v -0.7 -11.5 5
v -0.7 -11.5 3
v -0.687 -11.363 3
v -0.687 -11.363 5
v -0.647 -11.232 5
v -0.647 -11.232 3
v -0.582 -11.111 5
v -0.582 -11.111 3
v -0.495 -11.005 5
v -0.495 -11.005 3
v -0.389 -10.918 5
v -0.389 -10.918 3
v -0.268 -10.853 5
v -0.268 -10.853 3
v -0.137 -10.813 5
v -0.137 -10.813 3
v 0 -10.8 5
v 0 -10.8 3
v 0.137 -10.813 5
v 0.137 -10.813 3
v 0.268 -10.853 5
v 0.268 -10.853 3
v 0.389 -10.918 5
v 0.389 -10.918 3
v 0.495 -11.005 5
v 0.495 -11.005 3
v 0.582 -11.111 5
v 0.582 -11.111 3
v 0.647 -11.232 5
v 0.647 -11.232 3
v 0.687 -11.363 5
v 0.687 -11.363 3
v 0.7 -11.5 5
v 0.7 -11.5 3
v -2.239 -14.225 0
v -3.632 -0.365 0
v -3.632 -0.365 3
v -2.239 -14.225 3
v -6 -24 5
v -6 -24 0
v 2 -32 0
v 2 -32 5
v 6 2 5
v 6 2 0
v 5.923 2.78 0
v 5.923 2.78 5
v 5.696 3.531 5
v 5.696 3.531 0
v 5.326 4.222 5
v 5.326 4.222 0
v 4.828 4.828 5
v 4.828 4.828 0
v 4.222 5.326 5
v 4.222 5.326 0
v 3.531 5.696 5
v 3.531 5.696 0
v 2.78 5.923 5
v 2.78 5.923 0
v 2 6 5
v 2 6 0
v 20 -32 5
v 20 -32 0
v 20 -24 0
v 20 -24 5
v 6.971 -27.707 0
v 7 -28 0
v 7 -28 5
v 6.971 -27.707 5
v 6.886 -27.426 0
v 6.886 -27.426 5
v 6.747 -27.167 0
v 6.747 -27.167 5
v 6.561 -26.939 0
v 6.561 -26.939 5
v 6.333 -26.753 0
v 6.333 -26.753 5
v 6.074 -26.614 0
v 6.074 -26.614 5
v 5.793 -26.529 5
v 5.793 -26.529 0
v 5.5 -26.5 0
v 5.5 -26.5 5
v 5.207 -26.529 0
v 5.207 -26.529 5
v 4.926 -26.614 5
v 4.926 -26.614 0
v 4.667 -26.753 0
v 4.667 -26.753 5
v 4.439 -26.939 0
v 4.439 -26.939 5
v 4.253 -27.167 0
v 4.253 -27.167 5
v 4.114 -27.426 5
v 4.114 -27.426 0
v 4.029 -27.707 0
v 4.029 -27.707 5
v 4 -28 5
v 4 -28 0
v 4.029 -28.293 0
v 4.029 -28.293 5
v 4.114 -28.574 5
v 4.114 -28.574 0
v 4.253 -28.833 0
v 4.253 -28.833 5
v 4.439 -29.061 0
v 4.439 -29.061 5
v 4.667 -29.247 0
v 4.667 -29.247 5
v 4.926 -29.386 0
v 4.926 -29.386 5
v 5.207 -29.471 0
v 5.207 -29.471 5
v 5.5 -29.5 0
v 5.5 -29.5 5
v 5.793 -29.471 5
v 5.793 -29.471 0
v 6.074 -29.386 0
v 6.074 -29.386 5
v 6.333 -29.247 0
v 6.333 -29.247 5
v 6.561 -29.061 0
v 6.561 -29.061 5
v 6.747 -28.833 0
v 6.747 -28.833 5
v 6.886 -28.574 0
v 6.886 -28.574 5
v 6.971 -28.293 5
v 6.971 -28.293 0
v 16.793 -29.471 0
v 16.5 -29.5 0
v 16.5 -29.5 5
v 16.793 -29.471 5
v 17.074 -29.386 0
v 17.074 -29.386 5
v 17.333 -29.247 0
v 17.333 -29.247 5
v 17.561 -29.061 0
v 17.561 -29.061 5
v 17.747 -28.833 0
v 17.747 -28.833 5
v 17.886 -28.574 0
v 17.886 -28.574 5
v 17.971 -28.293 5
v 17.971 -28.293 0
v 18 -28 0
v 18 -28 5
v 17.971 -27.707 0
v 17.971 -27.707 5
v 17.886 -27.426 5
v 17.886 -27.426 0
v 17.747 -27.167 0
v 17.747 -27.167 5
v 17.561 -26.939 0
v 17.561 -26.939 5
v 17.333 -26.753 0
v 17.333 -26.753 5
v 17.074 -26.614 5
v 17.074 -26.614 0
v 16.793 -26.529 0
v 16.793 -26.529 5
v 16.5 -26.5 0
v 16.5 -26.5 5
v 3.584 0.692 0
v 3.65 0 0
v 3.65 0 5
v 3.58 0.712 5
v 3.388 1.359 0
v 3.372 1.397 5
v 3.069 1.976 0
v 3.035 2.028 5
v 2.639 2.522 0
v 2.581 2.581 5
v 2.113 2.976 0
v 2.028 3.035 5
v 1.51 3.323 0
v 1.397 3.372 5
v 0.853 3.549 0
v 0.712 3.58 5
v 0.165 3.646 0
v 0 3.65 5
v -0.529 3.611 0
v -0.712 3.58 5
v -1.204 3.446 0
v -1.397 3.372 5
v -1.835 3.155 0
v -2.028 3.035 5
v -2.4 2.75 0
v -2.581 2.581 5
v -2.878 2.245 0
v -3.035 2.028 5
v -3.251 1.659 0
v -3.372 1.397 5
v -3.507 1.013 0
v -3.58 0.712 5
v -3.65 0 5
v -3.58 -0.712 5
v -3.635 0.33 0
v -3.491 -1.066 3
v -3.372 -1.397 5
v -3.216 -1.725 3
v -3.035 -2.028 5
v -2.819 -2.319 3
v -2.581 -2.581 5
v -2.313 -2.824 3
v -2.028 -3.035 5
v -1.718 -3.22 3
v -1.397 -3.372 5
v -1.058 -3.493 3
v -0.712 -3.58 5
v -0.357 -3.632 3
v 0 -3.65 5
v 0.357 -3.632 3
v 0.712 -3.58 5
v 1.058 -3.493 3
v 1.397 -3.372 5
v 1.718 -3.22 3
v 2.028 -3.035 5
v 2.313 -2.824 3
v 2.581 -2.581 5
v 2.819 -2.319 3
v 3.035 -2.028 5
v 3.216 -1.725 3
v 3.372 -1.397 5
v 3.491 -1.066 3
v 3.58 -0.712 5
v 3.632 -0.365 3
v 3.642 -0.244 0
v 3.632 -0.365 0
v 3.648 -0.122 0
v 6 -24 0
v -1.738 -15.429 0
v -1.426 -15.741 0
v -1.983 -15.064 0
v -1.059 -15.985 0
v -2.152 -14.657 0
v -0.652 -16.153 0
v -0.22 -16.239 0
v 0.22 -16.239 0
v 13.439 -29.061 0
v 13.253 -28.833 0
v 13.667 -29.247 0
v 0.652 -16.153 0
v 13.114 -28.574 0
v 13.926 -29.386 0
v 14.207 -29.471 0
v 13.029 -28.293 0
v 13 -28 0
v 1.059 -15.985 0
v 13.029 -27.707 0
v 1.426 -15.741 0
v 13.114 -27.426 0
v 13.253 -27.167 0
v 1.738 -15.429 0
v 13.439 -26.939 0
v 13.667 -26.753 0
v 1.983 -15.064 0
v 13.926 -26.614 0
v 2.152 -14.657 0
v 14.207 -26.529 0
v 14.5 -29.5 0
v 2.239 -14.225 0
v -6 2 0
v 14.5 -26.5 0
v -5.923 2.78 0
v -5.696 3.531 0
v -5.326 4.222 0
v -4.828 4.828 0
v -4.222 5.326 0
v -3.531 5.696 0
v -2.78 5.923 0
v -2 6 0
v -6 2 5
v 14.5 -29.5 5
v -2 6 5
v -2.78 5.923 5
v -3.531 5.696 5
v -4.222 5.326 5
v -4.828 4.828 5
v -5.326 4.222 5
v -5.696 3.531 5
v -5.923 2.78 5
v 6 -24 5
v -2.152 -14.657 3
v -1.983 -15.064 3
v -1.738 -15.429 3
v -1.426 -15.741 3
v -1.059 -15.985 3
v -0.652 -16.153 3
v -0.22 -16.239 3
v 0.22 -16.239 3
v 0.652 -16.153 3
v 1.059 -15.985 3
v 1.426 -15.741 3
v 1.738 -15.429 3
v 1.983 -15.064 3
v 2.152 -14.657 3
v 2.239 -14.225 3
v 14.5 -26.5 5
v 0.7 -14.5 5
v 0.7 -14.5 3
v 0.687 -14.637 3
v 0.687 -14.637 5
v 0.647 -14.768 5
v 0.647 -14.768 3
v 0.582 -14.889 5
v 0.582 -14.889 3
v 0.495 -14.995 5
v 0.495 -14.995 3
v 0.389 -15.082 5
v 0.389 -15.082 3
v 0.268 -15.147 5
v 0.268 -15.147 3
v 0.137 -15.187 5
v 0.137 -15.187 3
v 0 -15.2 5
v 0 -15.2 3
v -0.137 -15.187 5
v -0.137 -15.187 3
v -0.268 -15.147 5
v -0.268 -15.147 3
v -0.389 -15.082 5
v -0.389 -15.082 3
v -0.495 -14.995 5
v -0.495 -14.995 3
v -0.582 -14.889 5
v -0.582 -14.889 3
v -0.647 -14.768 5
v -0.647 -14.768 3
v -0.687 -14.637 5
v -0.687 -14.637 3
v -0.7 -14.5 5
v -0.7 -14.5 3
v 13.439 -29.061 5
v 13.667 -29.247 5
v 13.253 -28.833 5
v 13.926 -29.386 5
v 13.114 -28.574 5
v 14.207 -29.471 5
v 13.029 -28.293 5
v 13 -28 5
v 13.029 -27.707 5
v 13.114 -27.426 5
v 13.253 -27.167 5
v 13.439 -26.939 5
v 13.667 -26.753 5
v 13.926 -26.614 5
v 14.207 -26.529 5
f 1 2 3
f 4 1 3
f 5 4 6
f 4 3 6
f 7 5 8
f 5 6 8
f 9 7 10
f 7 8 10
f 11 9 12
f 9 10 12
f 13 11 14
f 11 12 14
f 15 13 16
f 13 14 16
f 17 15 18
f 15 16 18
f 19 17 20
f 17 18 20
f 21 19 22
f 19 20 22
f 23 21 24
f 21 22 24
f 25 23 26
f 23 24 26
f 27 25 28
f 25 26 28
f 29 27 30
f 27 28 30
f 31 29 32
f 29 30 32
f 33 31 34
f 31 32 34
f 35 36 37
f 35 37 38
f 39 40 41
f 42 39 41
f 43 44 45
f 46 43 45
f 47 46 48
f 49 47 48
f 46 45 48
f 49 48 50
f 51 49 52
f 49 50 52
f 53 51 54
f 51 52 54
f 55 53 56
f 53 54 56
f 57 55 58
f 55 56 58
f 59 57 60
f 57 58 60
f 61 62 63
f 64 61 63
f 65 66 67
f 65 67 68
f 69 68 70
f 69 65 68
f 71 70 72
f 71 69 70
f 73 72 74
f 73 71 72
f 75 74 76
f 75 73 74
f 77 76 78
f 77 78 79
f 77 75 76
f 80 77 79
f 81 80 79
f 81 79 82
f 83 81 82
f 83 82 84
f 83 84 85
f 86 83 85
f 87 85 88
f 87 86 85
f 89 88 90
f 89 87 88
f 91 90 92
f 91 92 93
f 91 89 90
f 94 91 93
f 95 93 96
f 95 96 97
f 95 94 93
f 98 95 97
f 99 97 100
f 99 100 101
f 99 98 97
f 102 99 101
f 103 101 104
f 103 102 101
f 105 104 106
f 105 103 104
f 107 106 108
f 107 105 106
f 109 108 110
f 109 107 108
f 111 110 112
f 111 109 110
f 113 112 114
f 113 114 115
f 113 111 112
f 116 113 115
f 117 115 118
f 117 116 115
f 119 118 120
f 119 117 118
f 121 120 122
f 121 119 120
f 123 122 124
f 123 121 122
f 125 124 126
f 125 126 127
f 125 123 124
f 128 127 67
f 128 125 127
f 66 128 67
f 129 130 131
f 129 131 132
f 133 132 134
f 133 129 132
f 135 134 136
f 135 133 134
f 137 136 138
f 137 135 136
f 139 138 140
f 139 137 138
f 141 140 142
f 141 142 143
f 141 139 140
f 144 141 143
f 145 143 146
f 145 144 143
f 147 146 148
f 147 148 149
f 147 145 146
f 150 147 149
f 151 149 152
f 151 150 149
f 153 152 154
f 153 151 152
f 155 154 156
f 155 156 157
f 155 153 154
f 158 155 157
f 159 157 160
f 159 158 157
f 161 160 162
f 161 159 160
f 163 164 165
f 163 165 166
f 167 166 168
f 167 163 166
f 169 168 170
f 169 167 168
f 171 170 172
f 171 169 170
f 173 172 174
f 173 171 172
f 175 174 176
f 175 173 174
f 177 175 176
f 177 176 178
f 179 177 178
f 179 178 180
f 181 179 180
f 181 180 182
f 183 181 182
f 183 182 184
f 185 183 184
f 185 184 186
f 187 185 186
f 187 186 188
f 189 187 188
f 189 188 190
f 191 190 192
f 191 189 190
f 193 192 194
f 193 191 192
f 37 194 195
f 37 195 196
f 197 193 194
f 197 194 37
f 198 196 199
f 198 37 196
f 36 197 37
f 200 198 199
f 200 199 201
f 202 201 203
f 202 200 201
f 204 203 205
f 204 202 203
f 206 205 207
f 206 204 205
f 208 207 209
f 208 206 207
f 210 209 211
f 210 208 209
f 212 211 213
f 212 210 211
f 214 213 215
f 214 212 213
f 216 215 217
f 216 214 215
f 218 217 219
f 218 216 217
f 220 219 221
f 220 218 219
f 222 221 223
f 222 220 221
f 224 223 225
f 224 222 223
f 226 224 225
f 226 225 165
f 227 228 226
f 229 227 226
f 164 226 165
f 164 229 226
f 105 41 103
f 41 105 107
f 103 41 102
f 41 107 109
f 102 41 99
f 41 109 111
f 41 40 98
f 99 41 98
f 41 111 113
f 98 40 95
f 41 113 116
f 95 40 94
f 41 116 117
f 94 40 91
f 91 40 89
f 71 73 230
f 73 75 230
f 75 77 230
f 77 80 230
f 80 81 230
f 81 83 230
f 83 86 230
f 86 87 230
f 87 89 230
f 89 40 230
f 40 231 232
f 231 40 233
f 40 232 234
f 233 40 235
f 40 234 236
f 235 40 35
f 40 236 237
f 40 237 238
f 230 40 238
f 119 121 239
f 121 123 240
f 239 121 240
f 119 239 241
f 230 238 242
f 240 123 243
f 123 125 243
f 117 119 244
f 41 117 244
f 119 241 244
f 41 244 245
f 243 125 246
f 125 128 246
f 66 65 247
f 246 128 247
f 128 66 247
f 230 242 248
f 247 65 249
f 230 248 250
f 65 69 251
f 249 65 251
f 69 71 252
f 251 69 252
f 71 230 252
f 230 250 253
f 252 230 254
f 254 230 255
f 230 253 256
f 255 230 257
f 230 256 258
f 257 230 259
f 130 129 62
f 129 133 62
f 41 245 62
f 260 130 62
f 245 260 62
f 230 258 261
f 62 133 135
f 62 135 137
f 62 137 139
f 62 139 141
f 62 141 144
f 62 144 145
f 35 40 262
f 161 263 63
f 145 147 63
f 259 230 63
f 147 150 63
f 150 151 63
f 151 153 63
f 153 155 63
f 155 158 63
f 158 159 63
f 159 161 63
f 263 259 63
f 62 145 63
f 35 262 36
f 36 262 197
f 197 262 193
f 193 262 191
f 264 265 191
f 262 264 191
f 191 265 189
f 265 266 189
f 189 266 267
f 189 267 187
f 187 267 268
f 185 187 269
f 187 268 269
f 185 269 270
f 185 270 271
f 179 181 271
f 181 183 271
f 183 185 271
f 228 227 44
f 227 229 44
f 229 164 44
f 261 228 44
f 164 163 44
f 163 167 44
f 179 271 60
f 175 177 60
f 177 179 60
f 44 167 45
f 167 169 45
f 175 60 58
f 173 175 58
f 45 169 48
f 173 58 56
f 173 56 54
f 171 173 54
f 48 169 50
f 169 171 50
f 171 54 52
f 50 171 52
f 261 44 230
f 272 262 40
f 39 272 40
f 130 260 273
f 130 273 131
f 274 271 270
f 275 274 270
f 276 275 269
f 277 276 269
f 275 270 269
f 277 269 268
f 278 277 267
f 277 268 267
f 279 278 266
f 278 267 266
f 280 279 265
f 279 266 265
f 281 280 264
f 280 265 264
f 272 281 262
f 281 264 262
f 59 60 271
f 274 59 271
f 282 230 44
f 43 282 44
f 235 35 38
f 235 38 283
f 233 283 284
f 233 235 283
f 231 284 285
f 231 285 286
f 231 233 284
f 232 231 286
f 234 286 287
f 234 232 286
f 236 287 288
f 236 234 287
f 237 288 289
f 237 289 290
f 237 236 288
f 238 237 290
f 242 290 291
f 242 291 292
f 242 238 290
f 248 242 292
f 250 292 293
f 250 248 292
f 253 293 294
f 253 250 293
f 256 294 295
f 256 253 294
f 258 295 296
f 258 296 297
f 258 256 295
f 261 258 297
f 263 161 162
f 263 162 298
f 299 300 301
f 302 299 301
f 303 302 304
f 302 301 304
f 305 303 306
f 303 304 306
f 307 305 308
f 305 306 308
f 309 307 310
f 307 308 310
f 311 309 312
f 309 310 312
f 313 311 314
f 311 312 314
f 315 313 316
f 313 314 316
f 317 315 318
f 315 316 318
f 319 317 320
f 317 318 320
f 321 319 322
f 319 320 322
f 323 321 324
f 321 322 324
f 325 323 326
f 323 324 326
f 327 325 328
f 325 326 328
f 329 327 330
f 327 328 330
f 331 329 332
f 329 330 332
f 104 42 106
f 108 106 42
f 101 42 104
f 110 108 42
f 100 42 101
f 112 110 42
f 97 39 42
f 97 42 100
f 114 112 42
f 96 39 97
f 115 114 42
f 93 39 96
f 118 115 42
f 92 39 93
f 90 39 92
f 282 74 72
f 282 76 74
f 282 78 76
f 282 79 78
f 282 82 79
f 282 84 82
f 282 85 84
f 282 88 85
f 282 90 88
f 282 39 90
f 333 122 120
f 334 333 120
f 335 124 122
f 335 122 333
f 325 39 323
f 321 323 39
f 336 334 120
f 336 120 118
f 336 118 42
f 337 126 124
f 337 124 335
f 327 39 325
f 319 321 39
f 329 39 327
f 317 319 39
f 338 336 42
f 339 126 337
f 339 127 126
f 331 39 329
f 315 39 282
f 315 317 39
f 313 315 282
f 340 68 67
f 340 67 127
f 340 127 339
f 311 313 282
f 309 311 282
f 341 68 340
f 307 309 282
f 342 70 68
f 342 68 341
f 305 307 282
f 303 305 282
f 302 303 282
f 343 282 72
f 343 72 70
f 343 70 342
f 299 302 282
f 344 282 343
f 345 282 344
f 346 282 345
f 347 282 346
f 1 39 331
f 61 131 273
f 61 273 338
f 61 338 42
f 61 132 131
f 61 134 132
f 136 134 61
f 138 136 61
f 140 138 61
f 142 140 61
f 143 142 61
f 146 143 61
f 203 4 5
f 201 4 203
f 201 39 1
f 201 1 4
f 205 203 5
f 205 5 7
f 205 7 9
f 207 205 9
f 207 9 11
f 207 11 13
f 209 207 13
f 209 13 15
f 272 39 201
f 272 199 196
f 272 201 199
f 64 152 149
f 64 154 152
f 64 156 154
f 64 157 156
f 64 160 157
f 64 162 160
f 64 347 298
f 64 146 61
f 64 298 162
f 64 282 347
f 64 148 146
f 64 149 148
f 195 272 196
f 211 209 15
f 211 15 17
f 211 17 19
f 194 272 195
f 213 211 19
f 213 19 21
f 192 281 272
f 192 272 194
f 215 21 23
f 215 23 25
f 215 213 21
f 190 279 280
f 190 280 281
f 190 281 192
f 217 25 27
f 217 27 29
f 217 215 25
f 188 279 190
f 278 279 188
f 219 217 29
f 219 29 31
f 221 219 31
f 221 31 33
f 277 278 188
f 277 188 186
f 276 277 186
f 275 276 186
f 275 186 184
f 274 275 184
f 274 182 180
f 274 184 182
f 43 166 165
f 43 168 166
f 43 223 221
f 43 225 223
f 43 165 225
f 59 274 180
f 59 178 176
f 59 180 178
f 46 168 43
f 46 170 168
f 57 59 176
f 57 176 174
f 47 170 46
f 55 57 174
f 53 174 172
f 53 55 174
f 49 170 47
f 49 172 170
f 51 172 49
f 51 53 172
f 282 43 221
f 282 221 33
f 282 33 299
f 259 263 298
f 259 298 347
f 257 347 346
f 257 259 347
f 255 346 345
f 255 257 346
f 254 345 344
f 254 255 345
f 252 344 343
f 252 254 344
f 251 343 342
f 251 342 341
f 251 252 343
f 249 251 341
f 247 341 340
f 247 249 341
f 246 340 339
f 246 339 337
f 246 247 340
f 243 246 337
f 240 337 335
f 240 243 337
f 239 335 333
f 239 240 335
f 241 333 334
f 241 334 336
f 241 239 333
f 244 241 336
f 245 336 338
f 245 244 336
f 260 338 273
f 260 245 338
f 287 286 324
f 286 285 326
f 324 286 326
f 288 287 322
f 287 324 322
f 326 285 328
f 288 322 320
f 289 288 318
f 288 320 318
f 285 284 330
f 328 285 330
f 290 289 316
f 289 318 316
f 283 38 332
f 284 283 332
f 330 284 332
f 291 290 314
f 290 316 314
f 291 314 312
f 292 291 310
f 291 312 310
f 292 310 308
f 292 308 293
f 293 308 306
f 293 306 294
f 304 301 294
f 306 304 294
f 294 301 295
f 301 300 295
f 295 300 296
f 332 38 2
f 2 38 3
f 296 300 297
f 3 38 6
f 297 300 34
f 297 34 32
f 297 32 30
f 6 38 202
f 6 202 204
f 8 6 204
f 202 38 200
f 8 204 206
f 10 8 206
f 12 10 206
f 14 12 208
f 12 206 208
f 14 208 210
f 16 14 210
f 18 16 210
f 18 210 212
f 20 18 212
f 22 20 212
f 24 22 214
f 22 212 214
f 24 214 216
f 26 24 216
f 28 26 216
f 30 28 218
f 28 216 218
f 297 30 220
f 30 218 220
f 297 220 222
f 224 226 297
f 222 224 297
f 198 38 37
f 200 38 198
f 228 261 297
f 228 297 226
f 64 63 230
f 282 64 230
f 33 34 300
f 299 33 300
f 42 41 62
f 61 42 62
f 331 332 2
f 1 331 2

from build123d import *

# Parameters (mm, degrees)
ESBO_O1_R                = 3.65
ESBO_O1_R_2              = 1.5
RESSALTO_EXTRUS_O1_DEPTH = 5
CORTE_EXTRUS_O1_DEPTH    = 3


with BuildPart() as part:
    # Esboço1 → Ressalto-extrusão1 (new body)
    with BuildSketch(Plane.XY):
        with BuildLine():
            ThreePointArc((-2, 6), (-4.828427125, 4.828427125), (-6, 2))
            Line((-6, 2), (-6, -24))
            Line((-6, -24), (2, -32))
            Line((2, -32), (20, -32))
            Line((20, -32), (20, -24))
            Line((20, -24), (6, -24))
            Line((6, -24), (6, 2))
            ThreePointArc((6, 2), (4.828427125, 4.828427125), (2, 6))
            Line((2, 6), (-2, 6))
        make_face()
        Circle(ESBO_O1_R, mode=Mode.SUBTRACT)
        with BuildLine():
            ThreePointArc((0.7, -14.5), (0, -15.2), (-0.7, -14.5))
            Line((-0.7, -14.5), (-0.7, -11.5))
            ThreePointArc((-0.7, -11.5), (0, -10.8), (0.7, -11.5))
            Line((0.7, -11.5), (0.7, -14.5))
        make_face(mode=Mode.SUBTRACT)
        with Locations((5.5, -28)):
            Circle(ESBO_O1_R_2, mode=Mode.SUBTRACT)
        with BuildLine():
            Line((14.5, -26.5), (16.5, -26.5))
            ThreePointArc((16.5, -26.5), (18, -28), (16.5, -29.5))
            Line((16.5, -29.5), (14.5, -29.5))
            ThreePointArc((14.5, -29.5), (13, -28), (14.5, -26.5))
        make_face(mode=Mode.SUBTRACT)
    extrude(amount=RESSALTO_EXTRUS_O1_DEPTH)

    # Esboço1<3> → Corte-extrusão1 (cut)
    with BuildSketch(Plane.XY):
        with BuildLine():
            ThreePointArc((-2.238721733, -14.225), (0, -16.25), (2.238721733, -14.225))
            Line((2.238721733, -14.225), (3.631704145, -0.365))
            ThreePointArc((3.631704145, -0.365), (0, -3.65), (-3.631704145, -0.365))
            Line((-3.631704145, -0.365), (-2.238721733, -14.225))
        make_face()
        with BuildLine():
            ThreePointArc((0.7, -14.5), (0, -15.2), (-0.7, -14.5))
            Line((-0.7, -14.5), (-0.7, -11.5))
            ThreePointArc((-0.7, -11.5), (0, -10.8), (0.7, -11.5))
            Line((0.7, -11.5), (0.7, -14.5))
        make_face(mode=Mode.SUBTRACT)
    extrude(amount=CORTE_EXTRUS_O1_DEPTH, mode=Mode.SUBTRACT)


solid = part.part
